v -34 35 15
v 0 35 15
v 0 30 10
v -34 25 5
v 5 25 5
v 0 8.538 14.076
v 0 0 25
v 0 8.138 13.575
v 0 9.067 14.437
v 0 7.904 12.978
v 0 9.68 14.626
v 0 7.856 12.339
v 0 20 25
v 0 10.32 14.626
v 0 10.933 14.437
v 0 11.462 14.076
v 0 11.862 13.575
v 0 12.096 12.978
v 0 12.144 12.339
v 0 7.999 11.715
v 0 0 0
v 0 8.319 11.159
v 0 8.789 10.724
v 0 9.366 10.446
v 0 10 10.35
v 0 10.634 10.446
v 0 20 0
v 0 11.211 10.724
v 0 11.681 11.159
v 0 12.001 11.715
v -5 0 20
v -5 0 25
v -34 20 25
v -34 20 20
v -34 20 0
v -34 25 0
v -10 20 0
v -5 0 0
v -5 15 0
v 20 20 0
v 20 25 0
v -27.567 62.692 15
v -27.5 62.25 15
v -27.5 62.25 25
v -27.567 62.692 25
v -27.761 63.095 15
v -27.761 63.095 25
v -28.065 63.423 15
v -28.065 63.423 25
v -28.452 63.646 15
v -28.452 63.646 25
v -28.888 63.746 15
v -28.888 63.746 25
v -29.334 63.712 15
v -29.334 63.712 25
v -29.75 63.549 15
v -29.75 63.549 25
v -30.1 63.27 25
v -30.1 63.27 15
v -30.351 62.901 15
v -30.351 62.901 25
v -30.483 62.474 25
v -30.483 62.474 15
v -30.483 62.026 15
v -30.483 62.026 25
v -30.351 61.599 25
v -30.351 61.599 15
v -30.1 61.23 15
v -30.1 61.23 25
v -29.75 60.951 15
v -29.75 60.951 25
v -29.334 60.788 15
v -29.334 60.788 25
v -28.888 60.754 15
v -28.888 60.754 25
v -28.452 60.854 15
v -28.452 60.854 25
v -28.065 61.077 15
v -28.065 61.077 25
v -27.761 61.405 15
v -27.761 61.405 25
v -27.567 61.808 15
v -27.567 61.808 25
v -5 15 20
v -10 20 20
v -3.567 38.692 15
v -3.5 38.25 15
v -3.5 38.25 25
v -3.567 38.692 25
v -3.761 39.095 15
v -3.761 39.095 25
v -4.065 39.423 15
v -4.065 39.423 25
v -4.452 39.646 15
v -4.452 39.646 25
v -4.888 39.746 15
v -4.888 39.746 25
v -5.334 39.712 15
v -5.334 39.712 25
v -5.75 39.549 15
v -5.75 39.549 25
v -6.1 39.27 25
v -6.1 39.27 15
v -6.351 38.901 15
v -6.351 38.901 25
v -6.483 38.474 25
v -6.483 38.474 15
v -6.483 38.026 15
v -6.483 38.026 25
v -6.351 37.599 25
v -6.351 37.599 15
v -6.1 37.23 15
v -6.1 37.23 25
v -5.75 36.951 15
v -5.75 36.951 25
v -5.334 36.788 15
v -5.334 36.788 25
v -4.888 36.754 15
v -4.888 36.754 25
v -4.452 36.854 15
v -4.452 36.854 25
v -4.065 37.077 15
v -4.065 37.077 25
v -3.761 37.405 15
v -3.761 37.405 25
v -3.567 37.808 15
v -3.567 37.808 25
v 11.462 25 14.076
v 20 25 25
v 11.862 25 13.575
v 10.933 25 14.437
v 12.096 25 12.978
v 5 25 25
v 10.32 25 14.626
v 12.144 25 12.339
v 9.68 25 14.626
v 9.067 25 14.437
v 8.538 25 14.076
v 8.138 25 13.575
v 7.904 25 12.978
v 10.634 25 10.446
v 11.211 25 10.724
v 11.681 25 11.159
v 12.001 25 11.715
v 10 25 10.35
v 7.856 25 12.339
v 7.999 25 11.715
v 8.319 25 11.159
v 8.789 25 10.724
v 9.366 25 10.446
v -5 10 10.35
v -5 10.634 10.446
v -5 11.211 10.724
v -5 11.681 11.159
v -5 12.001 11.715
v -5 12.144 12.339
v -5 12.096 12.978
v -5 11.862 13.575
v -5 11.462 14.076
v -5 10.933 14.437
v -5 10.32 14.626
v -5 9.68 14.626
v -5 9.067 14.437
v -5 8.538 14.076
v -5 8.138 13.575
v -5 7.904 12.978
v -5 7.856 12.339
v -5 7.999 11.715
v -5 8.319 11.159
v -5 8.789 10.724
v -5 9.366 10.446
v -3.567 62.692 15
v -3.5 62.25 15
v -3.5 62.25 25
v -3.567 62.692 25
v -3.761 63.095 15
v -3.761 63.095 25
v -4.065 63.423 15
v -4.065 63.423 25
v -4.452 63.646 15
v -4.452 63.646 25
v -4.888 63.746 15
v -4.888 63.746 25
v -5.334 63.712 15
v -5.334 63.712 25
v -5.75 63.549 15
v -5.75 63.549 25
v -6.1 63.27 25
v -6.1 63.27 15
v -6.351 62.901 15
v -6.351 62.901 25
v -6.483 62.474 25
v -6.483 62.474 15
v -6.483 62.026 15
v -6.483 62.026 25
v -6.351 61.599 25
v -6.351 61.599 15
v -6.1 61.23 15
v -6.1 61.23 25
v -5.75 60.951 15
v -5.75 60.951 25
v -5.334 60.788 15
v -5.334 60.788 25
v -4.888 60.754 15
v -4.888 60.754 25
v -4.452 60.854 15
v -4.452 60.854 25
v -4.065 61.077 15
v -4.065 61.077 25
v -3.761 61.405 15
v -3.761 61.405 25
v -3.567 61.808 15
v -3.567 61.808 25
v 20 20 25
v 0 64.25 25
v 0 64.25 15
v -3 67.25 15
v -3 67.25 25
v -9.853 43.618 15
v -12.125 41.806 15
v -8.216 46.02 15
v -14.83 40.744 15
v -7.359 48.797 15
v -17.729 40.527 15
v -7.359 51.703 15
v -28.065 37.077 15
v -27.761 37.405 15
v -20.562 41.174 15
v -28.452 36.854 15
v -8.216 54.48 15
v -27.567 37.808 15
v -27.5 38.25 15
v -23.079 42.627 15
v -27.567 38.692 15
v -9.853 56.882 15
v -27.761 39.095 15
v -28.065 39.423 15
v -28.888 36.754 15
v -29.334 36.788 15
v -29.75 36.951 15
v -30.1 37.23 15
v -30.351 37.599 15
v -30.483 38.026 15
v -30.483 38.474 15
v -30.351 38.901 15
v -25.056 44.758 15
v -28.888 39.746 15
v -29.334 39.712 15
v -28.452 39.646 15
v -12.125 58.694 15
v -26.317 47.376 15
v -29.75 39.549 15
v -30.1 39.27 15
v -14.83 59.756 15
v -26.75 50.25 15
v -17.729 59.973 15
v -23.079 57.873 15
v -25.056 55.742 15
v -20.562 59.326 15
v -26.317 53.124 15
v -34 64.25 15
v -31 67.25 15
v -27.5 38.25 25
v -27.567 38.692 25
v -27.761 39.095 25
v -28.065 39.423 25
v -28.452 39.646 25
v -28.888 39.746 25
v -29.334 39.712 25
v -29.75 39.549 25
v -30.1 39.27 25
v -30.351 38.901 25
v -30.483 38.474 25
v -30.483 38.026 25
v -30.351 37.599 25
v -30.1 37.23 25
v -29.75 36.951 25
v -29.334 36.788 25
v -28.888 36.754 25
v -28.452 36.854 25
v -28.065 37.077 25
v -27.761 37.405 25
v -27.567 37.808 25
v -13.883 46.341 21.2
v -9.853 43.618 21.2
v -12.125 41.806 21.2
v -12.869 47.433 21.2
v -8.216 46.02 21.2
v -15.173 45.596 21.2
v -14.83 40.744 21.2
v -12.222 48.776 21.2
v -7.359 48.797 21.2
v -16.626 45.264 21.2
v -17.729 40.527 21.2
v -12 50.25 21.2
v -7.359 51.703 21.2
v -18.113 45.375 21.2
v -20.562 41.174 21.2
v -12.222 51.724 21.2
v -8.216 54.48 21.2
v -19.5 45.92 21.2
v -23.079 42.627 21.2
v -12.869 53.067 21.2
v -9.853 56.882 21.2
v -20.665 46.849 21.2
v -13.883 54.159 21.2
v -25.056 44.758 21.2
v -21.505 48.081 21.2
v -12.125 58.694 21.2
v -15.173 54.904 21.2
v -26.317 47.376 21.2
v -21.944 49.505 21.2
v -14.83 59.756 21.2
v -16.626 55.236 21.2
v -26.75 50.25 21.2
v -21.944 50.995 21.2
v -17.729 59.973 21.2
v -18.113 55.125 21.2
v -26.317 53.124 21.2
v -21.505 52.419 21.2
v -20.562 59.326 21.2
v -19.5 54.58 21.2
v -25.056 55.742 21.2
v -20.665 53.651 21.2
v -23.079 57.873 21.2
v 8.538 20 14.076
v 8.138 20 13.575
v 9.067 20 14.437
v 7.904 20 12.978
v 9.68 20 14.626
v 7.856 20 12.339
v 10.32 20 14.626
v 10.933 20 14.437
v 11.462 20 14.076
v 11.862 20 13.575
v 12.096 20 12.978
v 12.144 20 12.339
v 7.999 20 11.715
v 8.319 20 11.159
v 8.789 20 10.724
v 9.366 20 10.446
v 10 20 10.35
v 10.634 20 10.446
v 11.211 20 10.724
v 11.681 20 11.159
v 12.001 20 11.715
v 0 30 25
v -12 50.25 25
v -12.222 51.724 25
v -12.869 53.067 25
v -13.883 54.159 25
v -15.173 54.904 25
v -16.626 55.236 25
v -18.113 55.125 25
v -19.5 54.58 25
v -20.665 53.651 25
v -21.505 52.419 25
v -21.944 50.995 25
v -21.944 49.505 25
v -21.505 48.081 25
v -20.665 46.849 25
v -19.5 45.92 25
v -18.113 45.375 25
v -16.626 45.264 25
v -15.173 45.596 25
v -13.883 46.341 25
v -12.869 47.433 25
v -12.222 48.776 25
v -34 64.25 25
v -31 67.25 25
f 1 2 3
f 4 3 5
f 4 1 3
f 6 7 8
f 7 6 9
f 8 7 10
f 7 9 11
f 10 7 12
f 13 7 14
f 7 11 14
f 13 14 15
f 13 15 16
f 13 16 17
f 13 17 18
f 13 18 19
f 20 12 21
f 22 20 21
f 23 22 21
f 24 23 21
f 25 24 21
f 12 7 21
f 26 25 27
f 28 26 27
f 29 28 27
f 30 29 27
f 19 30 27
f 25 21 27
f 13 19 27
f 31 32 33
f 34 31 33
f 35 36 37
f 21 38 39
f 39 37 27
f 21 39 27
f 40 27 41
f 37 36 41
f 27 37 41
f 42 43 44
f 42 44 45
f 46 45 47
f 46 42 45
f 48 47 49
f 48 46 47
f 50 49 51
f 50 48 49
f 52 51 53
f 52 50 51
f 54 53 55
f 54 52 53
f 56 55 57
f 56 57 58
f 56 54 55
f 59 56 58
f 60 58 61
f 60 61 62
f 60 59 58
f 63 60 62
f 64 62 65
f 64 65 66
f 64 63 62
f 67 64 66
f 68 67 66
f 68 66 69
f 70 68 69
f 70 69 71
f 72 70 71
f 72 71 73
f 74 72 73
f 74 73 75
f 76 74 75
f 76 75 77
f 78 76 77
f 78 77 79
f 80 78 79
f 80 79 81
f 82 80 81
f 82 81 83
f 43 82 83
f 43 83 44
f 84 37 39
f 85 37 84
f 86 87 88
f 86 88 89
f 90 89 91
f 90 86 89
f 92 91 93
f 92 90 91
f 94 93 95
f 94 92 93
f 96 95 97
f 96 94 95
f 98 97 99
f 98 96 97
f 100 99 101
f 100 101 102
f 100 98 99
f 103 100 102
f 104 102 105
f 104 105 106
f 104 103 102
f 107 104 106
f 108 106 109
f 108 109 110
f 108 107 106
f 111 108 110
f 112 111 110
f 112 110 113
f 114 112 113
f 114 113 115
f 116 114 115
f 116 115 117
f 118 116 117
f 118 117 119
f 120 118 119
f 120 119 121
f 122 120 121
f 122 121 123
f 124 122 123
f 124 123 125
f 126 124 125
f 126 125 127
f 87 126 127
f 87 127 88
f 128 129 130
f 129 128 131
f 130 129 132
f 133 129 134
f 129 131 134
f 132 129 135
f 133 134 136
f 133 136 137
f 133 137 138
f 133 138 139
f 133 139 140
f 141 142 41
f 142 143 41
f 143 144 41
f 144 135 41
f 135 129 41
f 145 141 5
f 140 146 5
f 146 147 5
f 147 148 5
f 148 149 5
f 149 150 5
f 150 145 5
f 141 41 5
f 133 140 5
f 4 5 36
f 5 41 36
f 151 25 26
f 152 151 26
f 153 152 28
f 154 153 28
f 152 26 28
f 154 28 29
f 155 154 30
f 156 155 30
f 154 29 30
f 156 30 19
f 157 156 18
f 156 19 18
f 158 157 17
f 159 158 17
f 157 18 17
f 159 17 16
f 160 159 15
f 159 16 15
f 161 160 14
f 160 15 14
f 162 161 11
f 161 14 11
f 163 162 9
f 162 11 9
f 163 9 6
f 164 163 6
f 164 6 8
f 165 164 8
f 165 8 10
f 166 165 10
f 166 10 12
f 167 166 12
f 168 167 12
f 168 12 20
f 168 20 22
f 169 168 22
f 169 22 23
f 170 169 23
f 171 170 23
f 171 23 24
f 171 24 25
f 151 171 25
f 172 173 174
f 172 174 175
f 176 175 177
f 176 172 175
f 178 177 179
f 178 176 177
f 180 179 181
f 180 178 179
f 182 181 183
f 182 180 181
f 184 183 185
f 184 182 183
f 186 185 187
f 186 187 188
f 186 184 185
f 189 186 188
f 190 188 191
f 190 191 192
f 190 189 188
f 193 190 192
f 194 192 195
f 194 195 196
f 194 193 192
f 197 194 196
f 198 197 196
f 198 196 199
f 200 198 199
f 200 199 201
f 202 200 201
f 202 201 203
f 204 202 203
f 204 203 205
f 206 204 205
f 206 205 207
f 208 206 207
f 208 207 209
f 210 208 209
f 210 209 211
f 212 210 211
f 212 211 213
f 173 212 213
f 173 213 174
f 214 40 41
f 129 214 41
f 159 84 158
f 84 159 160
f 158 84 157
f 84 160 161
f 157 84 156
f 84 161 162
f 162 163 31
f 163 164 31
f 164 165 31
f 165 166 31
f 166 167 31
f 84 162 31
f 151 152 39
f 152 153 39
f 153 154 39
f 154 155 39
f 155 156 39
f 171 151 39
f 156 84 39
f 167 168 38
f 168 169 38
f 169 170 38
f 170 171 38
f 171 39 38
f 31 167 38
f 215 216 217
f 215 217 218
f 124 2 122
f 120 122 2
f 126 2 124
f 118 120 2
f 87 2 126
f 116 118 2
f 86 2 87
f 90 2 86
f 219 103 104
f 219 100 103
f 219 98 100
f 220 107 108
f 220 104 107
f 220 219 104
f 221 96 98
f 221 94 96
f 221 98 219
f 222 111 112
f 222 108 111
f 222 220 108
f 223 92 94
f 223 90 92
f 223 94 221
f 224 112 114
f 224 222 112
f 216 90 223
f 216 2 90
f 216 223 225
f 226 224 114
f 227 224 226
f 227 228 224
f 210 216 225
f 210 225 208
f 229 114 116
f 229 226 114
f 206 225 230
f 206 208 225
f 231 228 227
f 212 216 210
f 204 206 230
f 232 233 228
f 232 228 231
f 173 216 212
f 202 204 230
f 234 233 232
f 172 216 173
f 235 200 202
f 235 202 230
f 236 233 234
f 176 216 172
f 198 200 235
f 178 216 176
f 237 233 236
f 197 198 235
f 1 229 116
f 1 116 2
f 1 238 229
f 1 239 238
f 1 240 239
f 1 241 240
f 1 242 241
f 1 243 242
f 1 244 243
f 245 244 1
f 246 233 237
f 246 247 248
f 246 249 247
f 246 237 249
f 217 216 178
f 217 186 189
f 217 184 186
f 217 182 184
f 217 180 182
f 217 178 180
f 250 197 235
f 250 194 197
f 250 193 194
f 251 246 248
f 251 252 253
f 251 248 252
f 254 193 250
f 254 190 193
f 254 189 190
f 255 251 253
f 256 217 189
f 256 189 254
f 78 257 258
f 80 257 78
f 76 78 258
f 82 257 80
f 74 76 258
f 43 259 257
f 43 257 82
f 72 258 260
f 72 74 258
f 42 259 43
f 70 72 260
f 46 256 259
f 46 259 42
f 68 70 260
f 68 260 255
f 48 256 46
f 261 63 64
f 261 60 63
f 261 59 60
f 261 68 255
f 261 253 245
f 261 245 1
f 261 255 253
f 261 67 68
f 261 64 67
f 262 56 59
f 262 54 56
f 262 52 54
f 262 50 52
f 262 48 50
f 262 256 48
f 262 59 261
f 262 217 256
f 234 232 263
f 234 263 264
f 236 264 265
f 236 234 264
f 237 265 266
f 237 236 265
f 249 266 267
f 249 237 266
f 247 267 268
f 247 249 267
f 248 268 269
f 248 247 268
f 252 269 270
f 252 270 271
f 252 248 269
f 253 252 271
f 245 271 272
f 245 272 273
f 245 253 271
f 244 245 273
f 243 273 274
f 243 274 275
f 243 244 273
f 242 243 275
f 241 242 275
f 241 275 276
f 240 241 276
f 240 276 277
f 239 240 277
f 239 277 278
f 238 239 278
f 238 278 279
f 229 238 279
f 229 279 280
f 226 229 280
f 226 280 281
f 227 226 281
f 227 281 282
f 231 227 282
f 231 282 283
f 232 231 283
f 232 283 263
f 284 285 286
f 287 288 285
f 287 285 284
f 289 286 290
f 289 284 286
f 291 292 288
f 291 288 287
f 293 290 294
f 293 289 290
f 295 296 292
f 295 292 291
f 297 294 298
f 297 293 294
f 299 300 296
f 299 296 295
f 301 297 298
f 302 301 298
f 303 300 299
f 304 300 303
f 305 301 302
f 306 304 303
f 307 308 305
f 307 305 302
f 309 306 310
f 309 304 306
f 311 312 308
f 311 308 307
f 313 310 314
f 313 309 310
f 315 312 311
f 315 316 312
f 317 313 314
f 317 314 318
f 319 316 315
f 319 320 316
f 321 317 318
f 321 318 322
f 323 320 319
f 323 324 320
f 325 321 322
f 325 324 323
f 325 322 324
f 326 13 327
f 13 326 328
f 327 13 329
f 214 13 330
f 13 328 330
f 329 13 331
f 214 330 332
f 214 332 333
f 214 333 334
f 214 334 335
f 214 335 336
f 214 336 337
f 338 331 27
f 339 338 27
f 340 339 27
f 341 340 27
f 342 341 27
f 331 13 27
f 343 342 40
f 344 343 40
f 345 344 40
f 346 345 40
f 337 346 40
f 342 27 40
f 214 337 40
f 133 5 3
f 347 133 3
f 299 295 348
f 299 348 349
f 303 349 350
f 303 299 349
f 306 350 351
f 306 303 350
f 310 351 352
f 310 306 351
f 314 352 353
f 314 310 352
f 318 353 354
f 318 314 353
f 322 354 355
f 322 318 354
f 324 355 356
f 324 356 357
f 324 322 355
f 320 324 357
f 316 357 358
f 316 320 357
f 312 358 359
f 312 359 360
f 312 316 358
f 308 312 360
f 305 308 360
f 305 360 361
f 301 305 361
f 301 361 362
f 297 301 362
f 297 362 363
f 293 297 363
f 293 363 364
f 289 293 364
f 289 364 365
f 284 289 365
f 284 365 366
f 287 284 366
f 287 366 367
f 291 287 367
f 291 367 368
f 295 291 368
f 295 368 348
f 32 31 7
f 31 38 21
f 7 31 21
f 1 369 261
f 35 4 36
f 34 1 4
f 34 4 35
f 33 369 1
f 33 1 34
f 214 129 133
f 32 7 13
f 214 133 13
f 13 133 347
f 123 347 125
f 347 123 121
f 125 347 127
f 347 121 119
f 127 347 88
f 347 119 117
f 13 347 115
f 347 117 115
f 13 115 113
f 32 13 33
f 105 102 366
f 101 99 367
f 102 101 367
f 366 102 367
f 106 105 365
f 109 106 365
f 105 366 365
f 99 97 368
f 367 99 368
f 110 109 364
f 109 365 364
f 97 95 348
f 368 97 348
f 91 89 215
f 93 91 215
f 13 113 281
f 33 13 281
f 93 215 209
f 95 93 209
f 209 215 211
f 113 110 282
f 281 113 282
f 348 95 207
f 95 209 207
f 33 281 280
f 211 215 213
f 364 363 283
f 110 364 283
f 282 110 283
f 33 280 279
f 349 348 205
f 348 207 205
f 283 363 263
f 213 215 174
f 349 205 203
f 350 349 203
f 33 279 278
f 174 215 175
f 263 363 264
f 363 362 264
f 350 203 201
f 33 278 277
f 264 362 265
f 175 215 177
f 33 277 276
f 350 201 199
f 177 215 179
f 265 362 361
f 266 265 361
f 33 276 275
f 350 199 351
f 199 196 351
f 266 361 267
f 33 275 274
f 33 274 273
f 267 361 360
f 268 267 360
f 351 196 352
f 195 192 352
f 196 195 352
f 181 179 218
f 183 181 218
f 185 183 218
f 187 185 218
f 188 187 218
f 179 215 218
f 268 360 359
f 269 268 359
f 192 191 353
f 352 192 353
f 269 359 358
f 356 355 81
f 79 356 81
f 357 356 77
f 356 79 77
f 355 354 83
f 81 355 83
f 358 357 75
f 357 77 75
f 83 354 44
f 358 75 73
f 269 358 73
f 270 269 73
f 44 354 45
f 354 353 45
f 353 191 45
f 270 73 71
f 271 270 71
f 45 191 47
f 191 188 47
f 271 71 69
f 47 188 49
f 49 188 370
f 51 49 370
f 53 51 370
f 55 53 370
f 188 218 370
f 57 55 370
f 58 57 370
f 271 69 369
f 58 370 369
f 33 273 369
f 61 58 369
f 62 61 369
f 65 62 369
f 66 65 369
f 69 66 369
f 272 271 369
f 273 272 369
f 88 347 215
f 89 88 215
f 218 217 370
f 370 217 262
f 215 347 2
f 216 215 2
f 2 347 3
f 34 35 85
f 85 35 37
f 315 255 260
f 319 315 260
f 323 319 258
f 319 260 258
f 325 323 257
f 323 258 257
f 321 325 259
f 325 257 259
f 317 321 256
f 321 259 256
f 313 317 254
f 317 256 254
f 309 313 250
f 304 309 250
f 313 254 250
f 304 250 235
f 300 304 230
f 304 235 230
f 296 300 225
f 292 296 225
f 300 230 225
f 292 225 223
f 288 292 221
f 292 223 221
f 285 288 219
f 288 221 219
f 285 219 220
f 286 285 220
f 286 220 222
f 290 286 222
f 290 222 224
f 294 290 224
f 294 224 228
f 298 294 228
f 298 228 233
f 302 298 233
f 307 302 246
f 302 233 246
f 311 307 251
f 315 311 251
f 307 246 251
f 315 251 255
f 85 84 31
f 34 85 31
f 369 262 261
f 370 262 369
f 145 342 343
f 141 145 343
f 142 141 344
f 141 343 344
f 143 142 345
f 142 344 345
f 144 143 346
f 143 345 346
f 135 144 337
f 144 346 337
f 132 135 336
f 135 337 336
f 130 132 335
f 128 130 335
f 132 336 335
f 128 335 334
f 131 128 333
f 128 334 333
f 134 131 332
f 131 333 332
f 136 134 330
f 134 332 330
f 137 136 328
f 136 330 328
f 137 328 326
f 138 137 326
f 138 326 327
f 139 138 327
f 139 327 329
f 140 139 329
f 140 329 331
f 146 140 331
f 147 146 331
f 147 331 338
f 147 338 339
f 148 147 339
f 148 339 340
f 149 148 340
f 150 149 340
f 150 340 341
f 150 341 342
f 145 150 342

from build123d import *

# Parameters (mm, degrees)
SKETCH_1_R          = 5
SKETCH_1_R_2        = 1.5
EXTRUDE_1_DEPTH     = 25
SKETCH_2_R          = 2.15
CUT_EXTRUDE_1_DEPTH = 30
SKETCH_3_R          = 2.15
CUT_EXTRUDE_2_DEPTH = 30
SKETCH_4_W          = 34
SKETCH_4_H          = 42.25
CUT_EXTRUDE_3_DEPTH = 15
CHAMFER_1_SIZE      = 5
CHAMFER_2_SIZE      = 3
SKETCH_6_R          = 9.75
CUT_EXTRUDE_5_DEPTH = 6.2
EXTRUDE_2_DEPTH     = 5
CHAMFER_3_SIZE      = 10


with BuildPart() as part:
    # 草图1 → 凸台-拉伸1 (new body)
    with BuildSketch(Plane.XY):
        Polygon((0, 0), (0, 20), (20, 20), (20, 25), (0, 25), (0, 67.25), (-34, 67.25), (-34, 20), (-5, 20), (-5, 0), align=None)
        with Locations((-17, 50.25)):
            Circle(SKETCH_1_R, mode=Mode.SUBTRACT)
        with Locations((-29, 62.25)):
            Circle(SKETCH_1_R_2, mode=Mode.SUBTRACT)
        with Locations((-5, 62.25)):
            Circle(SKETCH_1_R_2, mode=Mode.SUBTRACT)
        with Locations((-29, 38.25)):
            Circle(SKETCH_1_R_2, mode=Mode.SUBTRACT)
        with Locations((-5, 38.25)):
            Circle(SKETCH_1_R_2, mode=Mode.SUBTRACT)
    extrude(amount=EXTRUDE_1_DEPTH)

    # 草图2 → 切除-拉伸1 (cut)
    with BuildSketch(Plane(origin=(0, 0, 0), x_dir=(0, 0, -1), z_dir=(1, 0, 0))):
        with Locations((-12.5, 10)):
            Circle(SKETCH_2_R)
    extrude(amount=-CUT_EXTRUDE_1_DEPTH, mode=Mode.SUBTRACT)

    # 草图3 → 切除-拉伸2 (cut)
    with BuildSketch(Plane.XZ.offset(-20)):
        with Locations(Location((10, 12.5, 0), (0, 0, 270))):
            Circle(SKETCH_3_R)
    extrude(amount=-CUT_EXTRUDE_2_DEPTH, mode=Mode.SUBTRACT)

    # 草图4 → 切除-拉伸3 (cut)
    with BuildSketch(Plane(origin=(0, 0, 0), x_dir=(-1, 0, 0), z_dir=(0, 0, -1))):
        with Locations((17, 46.125)):
            Rectangle(SKETCH_4_W, SKETCH_4_H)
    extrude(amount=-CUT_EXTRUDE_3_DEPTH, mode=Mode.SUBTRACT)

    # 倒角1
    chamfer_1_edges = [part.edges().sort_by_distance(p)[0] for p in [
        (-5, 20, 12.5),
        (0, 25, 20),
    ]]
    chamfer(chamfer_1_edges, length=CHAMFER_1_SIZE)

    # 倒角2
    chamfer_2_edges = [part.edges().sort_by_distance(p)[0] for p in [
        (-34, 67.25, 20),
        (0, 67.25, 20),
    ]]
    chamfer(chamfer_2_edges, length=CHAMFER_2_SIZE)

    # 草图6 → 切除-拉伸5 (cut)
    with BuildSketch(Plane(origin=(0, 0, 15), x_dir=(-1, 0, 0), z_dir=(0, 0, -1))):
        with Locations((17, 50.25)):
            Circle(SKETCH_6_R)
    extrude(amount=-CUT_EXTRUDE_5_DEPTH, mode=Mode.SUBTRACT)

    # 草图7 → 凸台-拉伸2 (add)
    with BuildSketch(Plane.XY.offset(25)):
        Polygon((-34, 20), (-10, 20), (-5, 15), (-5, 0), align=None)
    extrude(amount=-EXTRUDE_2_DEPTH)

    # 倒角3
    # the kernel refuses this chamfer: 10 mm, written as the material it adds along each edge
    with BuildSketch(Plane(origin=(-34, 25, 15), x_dir=(0, 0.9996219169112968, 0.027495876610586317), z_dir=(1, 0, 0))) as chamfer_3_piece_1_section:
        Polygon((CHAMFER_3_SIZE * 0.999621916911, -CHAMFER_3_SIZE * 0.0274958766106), (-CHAMFER_3_SIZE * 0.0274958766106, -CHAMFER_3_SIZE * 0.999621916911), (0, 0), align=None)
    chamfer_3_piece_1 = extrude(amount=64.71682988, mode=Mode.PRIVATE)
    chamfer_3_piece_1 = split(chamfer_3_piece_1, bisect_by=Plane(origin=(0, 28.236246517, 11.669766102), z_dir=(-1, 0, 0)), keep=Keep.TOP, mode=Mode.PRIVATE)
    chamfer_3_piece_1 = split(chamfer_3_piece_1, bisect_by=Plane(origin=(-7.726936811, 37.726936811, 11.669766102), z_dir=(-0.7071067811865476, -0.7071067811865476, 0)), keep=Keep.TOP, mode=Mode.PRIVATE)
    add(chamfer_3_piece_1)
    with BuildSketch(Plane(origin=(-34, 25, 15), x_dir=(0, 0.9996219169112968, 0.027495876610586317), z_dir=(1, 0, 0))) as chamfer_3_piece_2_section:
        Polygon((CHAMFER_3_SIZE * 0.999621916911, -CHAMFER_3_SIZE * 0.0274958766106), (-CHAMFER_3_SIZE * 0.0274958766106, -CHAMFER_3_SIZE * 0.999621916911), (0, 0), align=None)
    chamfer_3_piece_2 = extrude(amount=64.71682988, mode=Mode.PRIVATE)
    chamfer_3_piece_2 = split(chamfer_3_piece_2, bisect_by=Plane(origin=(0, 26.323776193, 10.636124878), z_dir=(1, 0, 0)), keep=Keep.TOP, mode=Mode.PRIVATE)
    chamfer_3_piece_2 = split(chamfer_3_piece_2, bisect_by=Plane(origin=(2.757167855, 27.242832145, 10.636124878), z_dir=(-0.7071067811865476, -0.7071067811865476, 0)), keep=Keep.TOP, mode=Mode.PRIVATE)
    add(chamfer_3_piece_2)
    with BuildSketch(Plane(origin=(-34, 25, 15), x_dir=(0, 0.9996219169112968, 0.027495876610586317), z_dir=(1, 0, 0))) as chamfer_3_piece_3_section:
        Polygon((CHAMFER_3_SIZE * 0.999621916911, -CHAMFER_3_SIZE * 0.0274958766106), (-CHAMFER_3_SIZE * 0.0274958766106, -CHAMFER_3_SIZE * 0.999621916911), (0, 0), align=None)
    chamfer_3_piece_3 = extrude(amount=64.71682988, mode=Mode.PRIVATE)
    chamfer_3_piece_3 = split(chamfer_3_piece_3, bisect_by=Plane(origin=(0, 32.729927819, 14.022430088), z_dir=(-1, 0, 0)), keep=Keep.TOP, mode=Mode.PRIVATE)
    chamfer_3_piece_3 = split(chamfer_3_piece_3, bisect_by=Plane(origin=(-2.047445864, 32.047445864, 14.022430088), z_dir=(0.7071067811865476, 0.7071067811865476, 0)), keep=Keep.TOP, mode=Mode.PRIVATE)
    add(chamfer_3_piece_3)


solid = part.part
